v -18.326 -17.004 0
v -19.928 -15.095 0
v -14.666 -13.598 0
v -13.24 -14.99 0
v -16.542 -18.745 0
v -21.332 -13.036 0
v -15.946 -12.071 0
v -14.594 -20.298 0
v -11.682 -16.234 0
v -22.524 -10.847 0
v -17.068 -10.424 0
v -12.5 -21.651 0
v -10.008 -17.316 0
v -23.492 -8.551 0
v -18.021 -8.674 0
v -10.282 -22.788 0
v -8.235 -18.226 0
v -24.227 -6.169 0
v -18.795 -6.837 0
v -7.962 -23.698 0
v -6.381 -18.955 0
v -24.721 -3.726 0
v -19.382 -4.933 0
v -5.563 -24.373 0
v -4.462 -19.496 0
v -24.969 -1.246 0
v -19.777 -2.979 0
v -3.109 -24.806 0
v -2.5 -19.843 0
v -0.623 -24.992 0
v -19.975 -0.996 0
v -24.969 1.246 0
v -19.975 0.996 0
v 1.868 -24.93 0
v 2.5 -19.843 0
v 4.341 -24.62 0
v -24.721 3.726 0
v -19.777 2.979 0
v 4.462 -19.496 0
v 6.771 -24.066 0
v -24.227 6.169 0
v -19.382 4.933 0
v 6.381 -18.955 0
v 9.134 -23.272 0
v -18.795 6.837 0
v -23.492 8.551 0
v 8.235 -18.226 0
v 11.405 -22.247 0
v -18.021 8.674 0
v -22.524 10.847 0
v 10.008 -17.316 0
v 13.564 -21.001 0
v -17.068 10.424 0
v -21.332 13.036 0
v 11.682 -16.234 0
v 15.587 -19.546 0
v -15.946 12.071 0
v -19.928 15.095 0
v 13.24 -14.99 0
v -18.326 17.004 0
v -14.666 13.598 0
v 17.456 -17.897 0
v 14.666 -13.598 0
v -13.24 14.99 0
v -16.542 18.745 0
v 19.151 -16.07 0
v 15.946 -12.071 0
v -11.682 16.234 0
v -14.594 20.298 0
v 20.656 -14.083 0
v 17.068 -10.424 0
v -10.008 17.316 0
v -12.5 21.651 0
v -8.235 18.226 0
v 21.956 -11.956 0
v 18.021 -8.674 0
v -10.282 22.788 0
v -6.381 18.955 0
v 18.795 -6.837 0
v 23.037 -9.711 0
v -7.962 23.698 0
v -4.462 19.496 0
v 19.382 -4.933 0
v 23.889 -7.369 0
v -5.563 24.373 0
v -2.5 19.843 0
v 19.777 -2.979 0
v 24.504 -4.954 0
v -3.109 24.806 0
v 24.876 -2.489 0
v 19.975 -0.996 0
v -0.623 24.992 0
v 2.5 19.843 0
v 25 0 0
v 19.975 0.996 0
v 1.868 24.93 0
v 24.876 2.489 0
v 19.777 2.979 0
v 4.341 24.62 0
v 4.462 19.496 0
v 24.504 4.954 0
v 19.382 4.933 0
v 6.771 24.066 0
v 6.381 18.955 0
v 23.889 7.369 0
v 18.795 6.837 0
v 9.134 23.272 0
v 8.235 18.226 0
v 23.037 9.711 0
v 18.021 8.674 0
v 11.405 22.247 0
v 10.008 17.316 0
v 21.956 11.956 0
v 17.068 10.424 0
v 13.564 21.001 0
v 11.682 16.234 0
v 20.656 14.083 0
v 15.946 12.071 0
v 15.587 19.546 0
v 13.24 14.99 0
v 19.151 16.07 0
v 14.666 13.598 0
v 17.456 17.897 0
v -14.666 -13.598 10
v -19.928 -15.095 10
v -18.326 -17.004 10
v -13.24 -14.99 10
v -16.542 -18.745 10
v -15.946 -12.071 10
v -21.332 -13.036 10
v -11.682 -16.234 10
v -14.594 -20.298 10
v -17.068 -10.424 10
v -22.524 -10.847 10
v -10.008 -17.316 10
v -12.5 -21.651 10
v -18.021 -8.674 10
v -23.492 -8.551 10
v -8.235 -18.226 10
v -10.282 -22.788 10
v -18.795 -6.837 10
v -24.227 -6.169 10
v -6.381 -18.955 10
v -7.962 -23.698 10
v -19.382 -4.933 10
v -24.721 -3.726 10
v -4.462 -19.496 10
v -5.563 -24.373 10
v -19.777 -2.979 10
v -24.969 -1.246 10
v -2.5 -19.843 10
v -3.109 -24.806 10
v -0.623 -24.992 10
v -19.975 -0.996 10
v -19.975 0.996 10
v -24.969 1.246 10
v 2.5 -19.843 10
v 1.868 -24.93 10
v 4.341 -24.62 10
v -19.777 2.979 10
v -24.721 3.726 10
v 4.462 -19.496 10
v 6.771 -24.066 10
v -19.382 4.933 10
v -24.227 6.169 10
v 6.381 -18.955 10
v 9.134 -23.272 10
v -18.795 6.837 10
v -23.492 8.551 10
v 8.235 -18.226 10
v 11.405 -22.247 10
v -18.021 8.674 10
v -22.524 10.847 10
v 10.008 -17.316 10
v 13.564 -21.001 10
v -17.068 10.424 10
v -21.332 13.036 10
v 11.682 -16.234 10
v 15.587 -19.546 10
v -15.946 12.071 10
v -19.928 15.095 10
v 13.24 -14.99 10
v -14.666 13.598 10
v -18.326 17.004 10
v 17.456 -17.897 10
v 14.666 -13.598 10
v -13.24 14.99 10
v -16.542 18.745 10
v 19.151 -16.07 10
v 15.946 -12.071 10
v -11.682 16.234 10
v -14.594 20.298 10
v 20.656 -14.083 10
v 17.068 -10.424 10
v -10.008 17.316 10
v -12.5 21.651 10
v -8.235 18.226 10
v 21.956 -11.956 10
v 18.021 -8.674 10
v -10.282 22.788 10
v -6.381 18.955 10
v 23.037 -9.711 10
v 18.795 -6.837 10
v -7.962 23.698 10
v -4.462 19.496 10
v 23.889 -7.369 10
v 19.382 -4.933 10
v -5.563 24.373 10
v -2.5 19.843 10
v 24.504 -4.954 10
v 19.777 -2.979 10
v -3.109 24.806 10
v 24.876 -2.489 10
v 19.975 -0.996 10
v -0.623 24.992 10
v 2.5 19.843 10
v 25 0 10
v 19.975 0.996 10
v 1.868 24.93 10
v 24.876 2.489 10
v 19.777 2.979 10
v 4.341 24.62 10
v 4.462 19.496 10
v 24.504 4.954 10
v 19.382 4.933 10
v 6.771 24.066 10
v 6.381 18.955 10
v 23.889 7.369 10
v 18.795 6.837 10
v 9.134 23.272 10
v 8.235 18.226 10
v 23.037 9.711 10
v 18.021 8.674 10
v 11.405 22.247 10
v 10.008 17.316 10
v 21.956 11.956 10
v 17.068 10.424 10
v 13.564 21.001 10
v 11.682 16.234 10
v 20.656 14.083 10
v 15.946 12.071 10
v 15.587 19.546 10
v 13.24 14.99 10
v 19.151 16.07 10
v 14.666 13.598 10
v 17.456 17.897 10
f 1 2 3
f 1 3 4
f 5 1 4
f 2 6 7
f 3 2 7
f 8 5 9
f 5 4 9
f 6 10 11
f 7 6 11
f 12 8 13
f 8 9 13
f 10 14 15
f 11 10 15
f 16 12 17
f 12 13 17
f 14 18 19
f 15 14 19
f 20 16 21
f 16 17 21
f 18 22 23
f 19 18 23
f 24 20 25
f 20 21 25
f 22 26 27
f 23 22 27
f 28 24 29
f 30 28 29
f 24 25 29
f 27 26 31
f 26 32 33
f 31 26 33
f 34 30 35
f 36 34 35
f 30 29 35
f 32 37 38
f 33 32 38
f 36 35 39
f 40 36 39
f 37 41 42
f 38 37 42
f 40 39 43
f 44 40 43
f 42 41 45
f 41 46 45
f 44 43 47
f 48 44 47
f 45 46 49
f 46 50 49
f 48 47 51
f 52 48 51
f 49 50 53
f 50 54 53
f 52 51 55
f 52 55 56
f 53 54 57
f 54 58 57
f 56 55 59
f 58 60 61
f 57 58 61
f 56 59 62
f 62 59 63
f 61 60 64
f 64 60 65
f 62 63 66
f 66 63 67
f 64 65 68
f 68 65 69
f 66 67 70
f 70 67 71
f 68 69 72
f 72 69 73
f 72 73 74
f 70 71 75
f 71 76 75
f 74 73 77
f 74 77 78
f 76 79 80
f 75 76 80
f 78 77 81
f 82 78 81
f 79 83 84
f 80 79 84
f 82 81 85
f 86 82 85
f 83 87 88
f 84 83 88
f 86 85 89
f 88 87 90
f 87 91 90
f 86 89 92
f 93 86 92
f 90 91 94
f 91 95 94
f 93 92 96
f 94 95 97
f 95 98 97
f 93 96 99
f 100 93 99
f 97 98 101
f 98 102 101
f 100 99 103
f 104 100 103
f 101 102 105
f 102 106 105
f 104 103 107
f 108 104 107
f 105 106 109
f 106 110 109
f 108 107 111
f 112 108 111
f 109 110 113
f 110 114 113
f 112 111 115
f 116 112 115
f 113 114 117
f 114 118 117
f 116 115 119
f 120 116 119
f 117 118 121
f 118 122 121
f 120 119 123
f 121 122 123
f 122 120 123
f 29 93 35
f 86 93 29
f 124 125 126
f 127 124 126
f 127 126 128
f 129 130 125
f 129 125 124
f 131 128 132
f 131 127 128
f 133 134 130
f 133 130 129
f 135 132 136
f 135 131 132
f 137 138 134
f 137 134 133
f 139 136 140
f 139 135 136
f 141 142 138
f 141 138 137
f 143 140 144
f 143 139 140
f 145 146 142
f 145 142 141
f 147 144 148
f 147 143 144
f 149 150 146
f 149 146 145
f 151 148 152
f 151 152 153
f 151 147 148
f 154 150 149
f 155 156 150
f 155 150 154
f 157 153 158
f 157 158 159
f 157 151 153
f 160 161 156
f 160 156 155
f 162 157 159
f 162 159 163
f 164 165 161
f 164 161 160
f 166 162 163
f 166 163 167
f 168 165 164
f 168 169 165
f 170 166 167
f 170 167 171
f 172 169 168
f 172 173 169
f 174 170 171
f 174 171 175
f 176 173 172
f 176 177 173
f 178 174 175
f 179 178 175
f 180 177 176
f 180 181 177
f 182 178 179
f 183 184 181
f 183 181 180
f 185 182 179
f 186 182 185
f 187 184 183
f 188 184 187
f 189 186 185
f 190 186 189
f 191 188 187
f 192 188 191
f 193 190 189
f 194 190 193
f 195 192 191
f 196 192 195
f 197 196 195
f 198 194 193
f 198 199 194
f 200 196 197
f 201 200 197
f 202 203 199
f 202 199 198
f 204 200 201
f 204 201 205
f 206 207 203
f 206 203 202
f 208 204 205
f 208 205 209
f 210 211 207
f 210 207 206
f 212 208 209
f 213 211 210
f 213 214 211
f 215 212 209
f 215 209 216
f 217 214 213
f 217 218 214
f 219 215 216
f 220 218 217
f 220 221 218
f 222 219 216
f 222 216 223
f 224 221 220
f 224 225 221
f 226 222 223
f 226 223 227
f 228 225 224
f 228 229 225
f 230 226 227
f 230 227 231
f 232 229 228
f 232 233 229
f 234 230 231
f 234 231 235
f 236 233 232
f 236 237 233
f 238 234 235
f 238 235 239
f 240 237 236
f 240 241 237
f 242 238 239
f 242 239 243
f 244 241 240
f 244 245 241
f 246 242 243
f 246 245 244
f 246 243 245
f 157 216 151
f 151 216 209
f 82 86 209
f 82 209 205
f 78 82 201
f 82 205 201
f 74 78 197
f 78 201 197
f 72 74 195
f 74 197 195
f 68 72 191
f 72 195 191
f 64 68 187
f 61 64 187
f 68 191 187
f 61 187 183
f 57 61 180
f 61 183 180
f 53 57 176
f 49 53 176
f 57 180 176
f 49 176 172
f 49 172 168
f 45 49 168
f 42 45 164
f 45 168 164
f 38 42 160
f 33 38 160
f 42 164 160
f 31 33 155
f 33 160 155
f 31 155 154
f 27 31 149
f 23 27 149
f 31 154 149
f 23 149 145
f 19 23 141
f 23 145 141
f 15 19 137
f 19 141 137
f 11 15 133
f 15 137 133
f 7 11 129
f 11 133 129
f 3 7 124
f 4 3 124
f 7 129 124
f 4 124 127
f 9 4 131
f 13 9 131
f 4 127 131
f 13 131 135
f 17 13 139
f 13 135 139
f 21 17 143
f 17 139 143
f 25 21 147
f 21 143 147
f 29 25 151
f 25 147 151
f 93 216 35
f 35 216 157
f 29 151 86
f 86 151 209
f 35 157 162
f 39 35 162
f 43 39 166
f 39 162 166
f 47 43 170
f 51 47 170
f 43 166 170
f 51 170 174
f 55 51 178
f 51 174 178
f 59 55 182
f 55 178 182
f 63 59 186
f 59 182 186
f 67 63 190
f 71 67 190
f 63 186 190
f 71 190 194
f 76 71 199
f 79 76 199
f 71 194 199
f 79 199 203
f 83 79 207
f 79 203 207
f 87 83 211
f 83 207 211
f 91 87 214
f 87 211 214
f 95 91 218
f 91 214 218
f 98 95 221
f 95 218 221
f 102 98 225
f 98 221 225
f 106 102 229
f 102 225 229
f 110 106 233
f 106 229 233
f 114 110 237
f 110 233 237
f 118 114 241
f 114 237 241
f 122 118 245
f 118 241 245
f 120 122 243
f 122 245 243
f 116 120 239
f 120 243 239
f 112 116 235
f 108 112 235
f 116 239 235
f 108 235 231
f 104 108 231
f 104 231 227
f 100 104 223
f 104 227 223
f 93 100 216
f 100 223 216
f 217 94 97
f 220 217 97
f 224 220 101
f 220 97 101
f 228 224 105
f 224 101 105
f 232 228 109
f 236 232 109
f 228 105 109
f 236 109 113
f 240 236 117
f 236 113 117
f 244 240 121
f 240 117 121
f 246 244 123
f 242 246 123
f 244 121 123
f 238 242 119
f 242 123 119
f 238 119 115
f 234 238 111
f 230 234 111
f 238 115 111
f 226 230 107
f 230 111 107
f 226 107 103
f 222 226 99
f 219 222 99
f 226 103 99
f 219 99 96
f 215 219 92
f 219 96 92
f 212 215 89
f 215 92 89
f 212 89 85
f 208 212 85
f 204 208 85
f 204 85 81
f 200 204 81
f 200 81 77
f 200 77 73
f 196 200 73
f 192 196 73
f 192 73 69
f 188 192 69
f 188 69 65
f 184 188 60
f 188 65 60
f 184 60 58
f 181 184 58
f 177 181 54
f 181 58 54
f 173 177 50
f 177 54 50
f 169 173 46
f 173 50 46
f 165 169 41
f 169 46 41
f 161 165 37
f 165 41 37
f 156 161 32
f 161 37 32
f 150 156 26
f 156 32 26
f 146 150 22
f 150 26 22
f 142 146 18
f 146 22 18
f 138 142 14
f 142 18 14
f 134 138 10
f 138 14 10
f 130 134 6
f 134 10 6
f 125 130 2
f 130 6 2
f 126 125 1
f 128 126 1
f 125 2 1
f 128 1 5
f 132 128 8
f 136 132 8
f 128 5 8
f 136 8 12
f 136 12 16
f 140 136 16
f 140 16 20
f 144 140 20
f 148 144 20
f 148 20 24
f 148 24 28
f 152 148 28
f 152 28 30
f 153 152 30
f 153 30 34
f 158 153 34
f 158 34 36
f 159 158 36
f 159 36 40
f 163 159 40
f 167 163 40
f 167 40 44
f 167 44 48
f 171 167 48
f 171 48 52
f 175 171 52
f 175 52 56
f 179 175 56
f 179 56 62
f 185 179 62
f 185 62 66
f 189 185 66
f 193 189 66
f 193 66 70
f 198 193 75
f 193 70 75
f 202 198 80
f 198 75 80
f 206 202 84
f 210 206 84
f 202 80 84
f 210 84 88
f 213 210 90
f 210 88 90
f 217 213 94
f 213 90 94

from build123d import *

# Parameters (mm, degrees)
F0_R     = 25
F1_DEPTH = 10
F3_DEPTH = 10


with BuildPart() as f1:
    # F0 (on Top) → F1 (new body)
    with BuildSketch(Plane.XY):
        Circle(F0_R)
    extrude(amount=F1_DEPTH)

    # F2 (on face) → F3 (cut)
    with BuildSketch(Plane.XY.offset(10)):
        with BuildLine():
            ThreePointArc((-2.499999, 19.843135), (-20, 0), (-2.499999, -19.843135))
            Line((-2.499999, -19.843135), (-2.499999, 19.843135))
        make_face()
        with BuildLine():
            ThreePointArc((2.500001, -19.843142), (20.000003, -7e-06), (2.500001, 19.843128))
            Line((2.500001, 19.843128), (2.500001, -19.843142))
        make_face()
    extrude(amount=-F3_DEPTH, mode=Mode.SUBTRACT)


solid = f1.part
